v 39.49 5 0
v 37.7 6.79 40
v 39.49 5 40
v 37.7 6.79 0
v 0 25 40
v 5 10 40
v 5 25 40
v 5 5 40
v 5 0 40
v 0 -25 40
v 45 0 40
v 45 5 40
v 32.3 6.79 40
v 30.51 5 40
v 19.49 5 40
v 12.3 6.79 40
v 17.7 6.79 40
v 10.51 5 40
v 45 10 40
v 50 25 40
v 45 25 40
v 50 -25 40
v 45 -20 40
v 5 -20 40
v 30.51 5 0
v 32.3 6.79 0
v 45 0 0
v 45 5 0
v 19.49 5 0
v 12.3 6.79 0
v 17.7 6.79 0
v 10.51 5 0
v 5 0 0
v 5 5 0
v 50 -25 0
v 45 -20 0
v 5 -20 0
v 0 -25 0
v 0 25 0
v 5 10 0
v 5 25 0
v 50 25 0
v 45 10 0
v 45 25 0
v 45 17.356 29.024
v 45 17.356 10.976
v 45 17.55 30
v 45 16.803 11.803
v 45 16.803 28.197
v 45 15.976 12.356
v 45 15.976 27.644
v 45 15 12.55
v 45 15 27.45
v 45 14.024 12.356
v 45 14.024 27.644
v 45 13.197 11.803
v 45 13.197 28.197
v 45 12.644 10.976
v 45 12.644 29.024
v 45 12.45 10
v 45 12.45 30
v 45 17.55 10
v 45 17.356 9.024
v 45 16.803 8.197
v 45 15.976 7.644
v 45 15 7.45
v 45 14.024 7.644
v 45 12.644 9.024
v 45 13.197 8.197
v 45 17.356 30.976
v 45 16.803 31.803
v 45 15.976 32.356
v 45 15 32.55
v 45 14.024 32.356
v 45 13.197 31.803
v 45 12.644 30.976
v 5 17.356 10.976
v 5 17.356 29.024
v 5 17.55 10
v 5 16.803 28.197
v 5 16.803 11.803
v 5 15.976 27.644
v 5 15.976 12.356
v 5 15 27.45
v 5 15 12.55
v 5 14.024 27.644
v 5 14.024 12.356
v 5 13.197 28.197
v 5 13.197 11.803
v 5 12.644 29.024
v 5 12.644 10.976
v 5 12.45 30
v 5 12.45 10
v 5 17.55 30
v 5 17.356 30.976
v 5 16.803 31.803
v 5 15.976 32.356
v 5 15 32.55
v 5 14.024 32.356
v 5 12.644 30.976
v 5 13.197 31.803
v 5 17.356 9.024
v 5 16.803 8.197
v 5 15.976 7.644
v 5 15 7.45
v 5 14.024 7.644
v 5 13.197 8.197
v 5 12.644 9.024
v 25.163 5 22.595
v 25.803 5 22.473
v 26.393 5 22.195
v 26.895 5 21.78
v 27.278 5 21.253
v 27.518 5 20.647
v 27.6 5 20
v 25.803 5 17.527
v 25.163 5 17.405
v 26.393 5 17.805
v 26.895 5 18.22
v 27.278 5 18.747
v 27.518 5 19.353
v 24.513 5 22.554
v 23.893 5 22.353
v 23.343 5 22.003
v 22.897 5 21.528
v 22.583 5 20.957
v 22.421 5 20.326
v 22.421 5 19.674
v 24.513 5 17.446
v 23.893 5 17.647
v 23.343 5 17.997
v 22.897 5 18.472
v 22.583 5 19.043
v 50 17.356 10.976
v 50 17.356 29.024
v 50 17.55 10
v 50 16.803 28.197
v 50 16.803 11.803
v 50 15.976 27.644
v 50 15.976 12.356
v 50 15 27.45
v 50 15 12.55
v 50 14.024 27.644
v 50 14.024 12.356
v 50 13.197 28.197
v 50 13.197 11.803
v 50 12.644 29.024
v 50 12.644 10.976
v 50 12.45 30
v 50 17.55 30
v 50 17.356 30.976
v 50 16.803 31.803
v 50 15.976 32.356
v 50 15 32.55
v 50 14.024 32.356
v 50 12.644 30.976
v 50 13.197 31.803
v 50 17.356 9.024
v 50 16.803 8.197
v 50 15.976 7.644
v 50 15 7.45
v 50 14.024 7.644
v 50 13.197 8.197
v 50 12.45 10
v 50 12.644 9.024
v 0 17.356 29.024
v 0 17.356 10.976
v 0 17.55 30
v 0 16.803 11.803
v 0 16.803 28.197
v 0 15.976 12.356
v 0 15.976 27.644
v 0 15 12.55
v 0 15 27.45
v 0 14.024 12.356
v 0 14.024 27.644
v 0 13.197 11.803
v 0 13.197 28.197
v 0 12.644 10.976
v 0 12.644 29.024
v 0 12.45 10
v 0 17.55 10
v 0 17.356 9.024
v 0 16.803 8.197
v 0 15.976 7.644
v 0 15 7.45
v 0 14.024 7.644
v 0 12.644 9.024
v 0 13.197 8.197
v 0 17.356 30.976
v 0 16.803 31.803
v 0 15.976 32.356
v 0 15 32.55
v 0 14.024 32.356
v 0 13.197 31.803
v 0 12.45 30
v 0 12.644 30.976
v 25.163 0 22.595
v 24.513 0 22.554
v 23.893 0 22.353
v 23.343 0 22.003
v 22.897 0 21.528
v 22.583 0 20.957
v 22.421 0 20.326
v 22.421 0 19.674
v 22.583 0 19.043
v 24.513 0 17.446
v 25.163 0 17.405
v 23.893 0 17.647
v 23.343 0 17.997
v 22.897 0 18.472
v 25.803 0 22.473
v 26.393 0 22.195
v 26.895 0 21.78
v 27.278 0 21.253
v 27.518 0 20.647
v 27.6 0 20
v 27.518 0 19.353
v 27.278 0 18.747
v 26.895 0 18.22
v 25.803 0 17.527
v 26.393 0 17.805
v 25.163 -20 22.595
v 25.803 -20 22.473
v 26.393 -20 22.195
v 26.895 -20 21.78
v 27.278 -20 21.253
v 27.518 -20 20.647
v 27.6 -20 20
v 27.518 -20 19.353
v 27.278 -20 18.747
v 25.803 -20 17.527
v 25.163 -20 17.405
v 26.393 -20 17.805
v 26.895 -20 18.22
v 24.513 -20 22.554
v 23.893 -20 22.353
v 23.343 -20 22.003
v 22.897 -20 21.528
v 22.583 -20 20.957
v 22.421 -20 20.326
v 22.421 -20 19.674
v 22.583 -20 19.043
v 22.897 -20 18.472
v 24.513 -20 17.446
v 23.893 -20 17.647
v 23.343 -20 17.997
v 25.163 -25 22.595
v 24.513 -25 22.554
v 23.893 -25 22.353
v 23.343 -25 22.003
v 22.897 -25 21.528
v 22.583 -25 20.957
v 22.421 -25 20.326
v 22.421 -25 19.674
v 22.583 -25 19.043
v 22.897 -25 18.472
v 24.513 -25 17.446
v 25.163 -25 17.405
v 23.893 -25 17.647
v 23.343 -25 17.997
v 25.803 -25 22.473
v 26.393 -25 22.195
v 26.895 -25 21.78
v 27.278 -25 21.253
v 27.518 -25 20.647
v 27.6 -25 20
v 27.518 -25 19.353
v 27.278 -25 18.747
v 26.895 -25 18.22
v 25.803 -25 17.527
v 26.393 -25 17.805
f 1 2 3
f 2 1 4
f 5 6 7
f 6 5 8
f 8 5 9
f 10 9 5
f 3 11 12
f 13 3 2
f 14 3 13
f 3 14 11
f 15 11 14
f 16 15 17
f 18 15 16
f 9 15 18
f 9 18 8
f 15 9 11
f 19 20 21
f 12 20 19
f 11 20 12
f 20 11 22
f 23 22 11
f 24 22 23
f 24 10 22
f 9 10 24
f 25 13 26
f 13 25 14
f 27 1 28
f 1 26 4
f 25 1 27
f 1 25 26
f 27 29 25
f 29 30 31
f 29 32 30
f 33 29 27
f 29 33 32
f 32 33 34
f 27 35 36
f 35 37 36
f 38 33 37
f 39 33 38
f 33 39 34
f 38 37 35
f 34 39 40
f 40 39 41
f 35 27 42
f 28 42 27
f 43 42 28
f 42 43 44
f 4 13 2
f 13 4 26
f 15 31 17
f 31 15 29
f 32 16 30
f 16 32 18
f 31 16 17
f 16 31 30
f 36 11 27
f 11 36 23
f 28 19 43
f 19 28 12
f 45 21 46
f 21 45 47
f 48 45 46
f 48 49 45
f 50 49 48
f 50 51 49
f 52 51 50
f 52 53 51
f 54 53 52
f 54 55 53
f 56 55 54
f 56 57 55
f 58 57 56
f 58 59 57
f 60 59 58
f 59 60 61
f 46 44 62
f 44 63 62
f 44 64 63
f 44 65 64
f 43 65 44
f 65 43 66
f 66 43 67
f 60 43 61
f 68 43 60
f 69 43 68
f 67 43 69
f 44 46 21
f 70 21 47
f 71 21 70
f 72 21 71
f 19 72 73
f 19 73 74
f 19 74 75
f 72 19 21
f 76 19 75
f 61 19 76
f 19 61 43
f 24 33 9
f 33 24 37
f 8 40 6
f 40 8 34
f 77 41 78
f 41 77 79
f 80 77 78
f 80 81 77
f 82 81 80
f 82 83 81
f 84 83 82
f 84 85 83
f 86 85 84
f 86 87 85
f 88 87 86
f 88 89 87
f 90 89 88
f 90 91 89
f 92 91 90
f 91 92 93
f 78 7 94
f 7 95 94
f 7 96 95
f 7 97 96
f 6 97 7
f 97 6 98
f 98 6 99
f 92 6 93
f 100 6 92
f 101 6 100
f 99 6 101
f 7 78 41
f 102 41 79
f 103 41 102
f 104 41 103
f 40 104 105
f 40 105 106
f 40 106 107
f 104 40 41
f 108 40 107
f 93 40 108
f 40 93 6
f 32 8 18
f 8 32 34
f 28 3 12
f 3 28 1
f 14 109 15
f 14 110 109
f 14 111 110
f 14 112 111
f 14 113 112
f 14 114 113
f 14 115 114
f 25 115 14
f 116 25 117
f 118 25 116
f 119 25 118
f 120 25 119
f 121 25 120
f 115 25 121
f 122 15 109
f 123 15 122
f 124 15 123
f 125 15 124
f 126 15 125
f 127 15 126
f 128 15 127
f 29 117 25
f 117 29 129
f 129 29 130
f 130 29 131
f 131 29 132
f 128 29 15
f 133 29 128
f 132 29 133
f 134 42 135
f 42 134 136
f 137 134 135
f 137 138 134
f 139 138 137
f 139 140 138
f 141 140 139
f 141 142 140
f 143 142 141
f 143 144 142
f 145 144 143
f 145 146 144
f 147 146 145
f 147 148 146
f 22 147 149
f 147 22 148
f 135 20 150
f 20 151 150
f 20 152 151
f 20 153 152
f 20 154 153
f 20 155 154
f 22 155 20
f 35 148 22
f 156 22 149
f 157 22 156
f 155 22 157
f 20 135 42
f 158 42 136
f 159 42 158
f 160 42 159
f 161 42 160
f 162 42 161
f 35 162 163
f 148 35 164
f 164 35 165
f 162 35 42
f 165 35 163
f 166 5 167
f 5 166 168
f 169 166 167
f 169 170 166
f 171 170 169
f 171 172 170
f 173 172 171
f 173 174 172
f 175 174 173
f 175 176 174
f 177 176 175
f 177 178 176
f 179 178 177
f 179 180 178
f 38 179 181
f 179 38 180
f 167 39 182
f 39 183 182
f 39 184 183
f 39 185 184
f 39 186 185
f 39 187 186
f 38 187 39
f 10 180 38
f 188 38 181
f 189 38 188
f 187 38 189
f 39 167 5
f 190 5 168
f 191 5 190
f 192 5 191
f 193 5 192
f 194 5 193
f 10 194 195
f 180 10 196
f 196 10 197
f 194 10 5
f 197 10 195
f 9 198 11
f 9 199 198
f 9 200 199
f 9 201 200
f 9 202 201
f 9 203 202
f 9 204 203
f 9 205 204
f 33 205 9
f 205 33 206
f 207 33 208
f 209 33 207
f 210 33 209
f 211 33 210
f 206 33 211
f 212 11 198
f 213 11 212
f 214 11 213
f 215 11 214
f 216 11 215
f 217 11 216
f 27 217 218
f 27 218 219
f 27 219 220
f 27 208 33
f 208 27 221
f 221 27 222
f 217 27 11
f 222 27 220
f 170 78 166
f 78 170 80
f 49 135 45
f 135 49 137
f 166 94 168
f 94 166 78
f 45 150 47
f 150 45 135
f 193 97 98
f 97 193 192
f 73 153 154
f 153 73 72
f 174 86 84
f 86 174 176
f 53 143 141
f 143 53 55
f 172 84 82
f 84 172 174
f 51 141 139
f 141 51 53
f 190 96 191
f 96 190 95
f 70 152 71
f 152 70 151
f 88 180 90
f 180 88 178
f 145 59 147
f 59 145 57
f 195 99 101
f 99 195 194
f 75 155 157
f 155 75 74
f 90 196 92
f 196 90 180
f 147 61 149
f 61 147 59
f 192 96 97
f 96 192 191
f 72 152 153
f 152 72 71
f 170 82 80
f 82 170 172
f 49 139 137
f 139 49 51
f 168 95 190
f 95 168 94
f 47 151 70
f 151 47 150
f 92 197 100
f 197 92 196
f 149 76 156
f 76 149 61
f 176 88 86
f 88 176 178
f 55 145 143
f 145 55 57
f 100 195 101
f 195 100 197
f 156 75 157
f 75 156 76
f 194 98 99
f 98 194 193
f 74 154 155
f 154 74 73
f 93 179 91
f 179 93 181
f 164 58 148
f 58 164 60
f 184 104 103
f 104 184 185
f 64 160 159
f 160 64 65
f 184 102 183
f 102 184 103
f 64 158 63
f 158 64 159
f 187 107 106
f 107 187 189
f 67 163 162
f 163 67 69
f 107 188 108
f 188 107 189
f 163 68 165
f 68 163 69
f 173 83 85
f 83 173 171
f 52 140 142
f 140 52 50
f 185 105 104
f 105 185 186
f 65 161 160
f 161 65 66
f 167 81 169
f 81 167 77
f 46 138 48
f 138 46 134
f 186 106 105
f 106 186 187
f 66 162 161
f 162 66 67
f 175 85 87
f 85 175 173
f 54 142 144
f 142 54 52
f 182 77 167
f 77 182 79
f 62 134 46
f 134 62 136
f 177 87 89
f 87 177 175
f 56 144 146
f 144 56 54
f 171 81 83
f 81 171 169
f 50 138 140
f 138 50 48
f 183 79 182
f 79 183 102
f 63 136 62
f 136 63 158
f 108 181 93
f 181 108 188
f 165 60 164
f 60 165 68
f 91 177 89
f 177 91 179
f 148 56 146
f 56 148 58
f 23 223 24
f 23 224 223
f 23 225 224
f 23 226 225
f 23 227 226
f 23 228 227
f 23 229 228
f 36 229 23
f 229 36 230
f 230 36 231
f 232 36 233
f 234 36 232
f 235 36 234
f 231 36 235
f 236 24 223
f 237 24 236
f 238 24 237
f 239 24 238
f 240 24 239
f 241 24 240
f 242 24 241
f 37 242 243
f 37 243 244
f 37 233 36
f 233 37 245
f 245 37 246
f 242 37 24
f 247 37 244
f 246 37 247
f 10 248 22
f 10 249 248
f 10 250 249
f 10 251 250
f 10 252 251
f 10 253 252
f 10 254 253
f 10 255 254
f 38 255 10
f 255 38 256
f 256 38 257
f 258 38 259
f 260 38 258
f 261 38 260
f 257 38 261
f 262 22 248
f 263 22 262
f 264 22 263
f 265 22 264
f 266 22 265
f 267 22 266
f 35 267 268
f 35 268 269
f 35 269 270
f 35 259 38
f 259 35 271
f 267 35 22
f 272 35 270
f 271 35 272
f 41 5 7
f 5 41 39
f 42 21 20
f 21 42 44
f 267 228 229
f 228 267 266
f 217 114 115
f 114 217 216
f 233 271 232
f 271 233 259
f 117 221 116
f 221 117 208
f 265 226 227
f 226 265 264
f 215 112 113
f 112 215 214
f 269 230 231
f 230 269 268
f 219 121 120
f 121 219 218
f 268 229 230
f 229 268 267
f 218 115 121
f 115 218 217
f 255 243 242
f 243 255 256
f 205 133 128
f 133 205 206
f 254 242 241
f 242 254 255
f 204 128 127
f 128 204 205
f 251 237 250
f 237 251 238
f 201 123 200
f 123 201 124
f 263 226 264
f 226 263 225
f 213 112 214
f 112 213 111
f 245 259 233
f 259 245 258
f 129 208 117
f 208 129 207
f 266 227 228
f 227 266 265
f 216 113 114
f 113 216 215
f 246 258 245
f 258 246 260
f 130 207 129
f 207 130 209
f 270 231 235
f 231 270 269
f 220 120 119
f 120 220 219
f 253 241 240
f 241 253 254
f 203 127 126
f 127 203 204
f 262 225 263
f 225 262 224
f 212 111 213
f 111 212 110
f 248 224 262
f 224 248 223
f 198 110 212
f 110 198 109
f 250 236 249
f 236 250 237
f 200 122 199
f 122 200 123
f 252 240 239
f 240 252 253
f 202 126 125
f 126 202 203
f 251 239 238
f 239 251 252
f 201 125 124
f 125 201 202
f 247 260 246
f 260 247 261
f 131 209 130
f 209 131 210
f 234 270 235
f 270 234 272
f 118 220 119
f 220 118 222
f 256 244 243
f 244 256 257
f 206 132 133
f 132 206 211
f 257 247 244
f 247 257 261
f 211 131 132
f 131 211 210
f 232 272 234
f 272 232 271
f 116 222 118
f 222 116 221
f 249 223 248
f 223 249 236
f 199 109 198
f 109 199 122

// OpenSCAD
thickness = 10;
height = 40;
extrusion_x = 40;
extrusion_y = 40;
center_x = thickness / 2 + 20;
center_z = height / 2;

motor_mount();

module motor_mount(){
    difference(){
        union(){
            base();
            translate([0,-25 - (thickness / 2) + thickness / 2,0]) mount();            
        }  
  
        //Cutout to only wrap around half the extrusion
        translate([0, thickness / 2 + extrusion_y / 2, 0]) cube([extrusion_x + thickness, extrusion_y, height]);
        
        //Axle hole
        translate([(40 + thickness ) / 2, thickness / 2 + 2.5, 20]) rotate([90,0,0]) cylinder(d=5.2, $fn=25, h=extrusion_y + thickness * 2 + 5);     
    }
}

module mount(){
    difference(){
        linear_extrude(height=height){
            difference(){
                square([40 + thickness / 2 * 2, 30 + thickness / 2]);
                translate([thickness / 2,thickness / 2,0]) square([40, 30 + thickness]);
            }        
        }
    }

}

module base(){
    translate([(thickness + extrusion_x) / 2, (extrusion_y / 2) + (thickness /2 ),height / 2]){
        difference(){
           cube([extrusion_x + thickness, extrusion_y + thickness, height], center=true);
           
            vslot_extrusion(extrusion_x,extrusion_y,height);
           translate([0, -extrusion_y / 4, extrusion_y / 4]) rotate([0,90,0])  cylinder(d=5.1, h=thickness * 2 + 40, $fn=16, center=true); 
           translate([0, -extrusion_y / 4, -extrusion_y / 4]) rotate([0,90,0])  cylinder(d=5.1, h=thickness * 2 + 40, $fn=16, center=true); 

        }         
    }
   
}



module vslot_extrusion(x,y,length = 20) {
    difference(){
        cube([x,y,length],center=true);
        //translate([x / 2 + 0.01,y / 4,0]) vslot();
        //translate([x / 2 + 0.01,-y  / 4,0]) vslot();
        //translate([-x / 2 - 0.01,-y / 4,0]) rotate([0,0,180]) vslot();
        //translate([-x / 2 - 0.01,y / 4,0]) rotate([0,0,180]) vslot();
        //translate([x / 4,y / 2 + 0.01,0]) rotate([0,0,90]) vslot();
        //translate([-x / 4,y / 2 + 0.01,0]) rotate([0,0,90]) vslot();
        translate([x / 4,-y / 2 - 0.01,0]) rotate([0,0,-90]) vslot();
        translate([-x / 4,-y / 2 - 0.01,0]) rotate([0,0,-90]) vslot();
    }
    
    module vslot(){
        difference() {
            translate([0, 0, 0]) rotate([0, 0, 0])
             cylinder(r=4.5, h=length, center=true,  $fn=4);	

    //plane sides
            translate([-3.8, 0, 0]) rotate([0, 0, 0])
             cube([4, 20, length*2], center=true);
            translate([3, 0, 0]) rotate([0, 0, 0])
             cube([6, 20, length*2], center=true);
        }        
    }
}    
